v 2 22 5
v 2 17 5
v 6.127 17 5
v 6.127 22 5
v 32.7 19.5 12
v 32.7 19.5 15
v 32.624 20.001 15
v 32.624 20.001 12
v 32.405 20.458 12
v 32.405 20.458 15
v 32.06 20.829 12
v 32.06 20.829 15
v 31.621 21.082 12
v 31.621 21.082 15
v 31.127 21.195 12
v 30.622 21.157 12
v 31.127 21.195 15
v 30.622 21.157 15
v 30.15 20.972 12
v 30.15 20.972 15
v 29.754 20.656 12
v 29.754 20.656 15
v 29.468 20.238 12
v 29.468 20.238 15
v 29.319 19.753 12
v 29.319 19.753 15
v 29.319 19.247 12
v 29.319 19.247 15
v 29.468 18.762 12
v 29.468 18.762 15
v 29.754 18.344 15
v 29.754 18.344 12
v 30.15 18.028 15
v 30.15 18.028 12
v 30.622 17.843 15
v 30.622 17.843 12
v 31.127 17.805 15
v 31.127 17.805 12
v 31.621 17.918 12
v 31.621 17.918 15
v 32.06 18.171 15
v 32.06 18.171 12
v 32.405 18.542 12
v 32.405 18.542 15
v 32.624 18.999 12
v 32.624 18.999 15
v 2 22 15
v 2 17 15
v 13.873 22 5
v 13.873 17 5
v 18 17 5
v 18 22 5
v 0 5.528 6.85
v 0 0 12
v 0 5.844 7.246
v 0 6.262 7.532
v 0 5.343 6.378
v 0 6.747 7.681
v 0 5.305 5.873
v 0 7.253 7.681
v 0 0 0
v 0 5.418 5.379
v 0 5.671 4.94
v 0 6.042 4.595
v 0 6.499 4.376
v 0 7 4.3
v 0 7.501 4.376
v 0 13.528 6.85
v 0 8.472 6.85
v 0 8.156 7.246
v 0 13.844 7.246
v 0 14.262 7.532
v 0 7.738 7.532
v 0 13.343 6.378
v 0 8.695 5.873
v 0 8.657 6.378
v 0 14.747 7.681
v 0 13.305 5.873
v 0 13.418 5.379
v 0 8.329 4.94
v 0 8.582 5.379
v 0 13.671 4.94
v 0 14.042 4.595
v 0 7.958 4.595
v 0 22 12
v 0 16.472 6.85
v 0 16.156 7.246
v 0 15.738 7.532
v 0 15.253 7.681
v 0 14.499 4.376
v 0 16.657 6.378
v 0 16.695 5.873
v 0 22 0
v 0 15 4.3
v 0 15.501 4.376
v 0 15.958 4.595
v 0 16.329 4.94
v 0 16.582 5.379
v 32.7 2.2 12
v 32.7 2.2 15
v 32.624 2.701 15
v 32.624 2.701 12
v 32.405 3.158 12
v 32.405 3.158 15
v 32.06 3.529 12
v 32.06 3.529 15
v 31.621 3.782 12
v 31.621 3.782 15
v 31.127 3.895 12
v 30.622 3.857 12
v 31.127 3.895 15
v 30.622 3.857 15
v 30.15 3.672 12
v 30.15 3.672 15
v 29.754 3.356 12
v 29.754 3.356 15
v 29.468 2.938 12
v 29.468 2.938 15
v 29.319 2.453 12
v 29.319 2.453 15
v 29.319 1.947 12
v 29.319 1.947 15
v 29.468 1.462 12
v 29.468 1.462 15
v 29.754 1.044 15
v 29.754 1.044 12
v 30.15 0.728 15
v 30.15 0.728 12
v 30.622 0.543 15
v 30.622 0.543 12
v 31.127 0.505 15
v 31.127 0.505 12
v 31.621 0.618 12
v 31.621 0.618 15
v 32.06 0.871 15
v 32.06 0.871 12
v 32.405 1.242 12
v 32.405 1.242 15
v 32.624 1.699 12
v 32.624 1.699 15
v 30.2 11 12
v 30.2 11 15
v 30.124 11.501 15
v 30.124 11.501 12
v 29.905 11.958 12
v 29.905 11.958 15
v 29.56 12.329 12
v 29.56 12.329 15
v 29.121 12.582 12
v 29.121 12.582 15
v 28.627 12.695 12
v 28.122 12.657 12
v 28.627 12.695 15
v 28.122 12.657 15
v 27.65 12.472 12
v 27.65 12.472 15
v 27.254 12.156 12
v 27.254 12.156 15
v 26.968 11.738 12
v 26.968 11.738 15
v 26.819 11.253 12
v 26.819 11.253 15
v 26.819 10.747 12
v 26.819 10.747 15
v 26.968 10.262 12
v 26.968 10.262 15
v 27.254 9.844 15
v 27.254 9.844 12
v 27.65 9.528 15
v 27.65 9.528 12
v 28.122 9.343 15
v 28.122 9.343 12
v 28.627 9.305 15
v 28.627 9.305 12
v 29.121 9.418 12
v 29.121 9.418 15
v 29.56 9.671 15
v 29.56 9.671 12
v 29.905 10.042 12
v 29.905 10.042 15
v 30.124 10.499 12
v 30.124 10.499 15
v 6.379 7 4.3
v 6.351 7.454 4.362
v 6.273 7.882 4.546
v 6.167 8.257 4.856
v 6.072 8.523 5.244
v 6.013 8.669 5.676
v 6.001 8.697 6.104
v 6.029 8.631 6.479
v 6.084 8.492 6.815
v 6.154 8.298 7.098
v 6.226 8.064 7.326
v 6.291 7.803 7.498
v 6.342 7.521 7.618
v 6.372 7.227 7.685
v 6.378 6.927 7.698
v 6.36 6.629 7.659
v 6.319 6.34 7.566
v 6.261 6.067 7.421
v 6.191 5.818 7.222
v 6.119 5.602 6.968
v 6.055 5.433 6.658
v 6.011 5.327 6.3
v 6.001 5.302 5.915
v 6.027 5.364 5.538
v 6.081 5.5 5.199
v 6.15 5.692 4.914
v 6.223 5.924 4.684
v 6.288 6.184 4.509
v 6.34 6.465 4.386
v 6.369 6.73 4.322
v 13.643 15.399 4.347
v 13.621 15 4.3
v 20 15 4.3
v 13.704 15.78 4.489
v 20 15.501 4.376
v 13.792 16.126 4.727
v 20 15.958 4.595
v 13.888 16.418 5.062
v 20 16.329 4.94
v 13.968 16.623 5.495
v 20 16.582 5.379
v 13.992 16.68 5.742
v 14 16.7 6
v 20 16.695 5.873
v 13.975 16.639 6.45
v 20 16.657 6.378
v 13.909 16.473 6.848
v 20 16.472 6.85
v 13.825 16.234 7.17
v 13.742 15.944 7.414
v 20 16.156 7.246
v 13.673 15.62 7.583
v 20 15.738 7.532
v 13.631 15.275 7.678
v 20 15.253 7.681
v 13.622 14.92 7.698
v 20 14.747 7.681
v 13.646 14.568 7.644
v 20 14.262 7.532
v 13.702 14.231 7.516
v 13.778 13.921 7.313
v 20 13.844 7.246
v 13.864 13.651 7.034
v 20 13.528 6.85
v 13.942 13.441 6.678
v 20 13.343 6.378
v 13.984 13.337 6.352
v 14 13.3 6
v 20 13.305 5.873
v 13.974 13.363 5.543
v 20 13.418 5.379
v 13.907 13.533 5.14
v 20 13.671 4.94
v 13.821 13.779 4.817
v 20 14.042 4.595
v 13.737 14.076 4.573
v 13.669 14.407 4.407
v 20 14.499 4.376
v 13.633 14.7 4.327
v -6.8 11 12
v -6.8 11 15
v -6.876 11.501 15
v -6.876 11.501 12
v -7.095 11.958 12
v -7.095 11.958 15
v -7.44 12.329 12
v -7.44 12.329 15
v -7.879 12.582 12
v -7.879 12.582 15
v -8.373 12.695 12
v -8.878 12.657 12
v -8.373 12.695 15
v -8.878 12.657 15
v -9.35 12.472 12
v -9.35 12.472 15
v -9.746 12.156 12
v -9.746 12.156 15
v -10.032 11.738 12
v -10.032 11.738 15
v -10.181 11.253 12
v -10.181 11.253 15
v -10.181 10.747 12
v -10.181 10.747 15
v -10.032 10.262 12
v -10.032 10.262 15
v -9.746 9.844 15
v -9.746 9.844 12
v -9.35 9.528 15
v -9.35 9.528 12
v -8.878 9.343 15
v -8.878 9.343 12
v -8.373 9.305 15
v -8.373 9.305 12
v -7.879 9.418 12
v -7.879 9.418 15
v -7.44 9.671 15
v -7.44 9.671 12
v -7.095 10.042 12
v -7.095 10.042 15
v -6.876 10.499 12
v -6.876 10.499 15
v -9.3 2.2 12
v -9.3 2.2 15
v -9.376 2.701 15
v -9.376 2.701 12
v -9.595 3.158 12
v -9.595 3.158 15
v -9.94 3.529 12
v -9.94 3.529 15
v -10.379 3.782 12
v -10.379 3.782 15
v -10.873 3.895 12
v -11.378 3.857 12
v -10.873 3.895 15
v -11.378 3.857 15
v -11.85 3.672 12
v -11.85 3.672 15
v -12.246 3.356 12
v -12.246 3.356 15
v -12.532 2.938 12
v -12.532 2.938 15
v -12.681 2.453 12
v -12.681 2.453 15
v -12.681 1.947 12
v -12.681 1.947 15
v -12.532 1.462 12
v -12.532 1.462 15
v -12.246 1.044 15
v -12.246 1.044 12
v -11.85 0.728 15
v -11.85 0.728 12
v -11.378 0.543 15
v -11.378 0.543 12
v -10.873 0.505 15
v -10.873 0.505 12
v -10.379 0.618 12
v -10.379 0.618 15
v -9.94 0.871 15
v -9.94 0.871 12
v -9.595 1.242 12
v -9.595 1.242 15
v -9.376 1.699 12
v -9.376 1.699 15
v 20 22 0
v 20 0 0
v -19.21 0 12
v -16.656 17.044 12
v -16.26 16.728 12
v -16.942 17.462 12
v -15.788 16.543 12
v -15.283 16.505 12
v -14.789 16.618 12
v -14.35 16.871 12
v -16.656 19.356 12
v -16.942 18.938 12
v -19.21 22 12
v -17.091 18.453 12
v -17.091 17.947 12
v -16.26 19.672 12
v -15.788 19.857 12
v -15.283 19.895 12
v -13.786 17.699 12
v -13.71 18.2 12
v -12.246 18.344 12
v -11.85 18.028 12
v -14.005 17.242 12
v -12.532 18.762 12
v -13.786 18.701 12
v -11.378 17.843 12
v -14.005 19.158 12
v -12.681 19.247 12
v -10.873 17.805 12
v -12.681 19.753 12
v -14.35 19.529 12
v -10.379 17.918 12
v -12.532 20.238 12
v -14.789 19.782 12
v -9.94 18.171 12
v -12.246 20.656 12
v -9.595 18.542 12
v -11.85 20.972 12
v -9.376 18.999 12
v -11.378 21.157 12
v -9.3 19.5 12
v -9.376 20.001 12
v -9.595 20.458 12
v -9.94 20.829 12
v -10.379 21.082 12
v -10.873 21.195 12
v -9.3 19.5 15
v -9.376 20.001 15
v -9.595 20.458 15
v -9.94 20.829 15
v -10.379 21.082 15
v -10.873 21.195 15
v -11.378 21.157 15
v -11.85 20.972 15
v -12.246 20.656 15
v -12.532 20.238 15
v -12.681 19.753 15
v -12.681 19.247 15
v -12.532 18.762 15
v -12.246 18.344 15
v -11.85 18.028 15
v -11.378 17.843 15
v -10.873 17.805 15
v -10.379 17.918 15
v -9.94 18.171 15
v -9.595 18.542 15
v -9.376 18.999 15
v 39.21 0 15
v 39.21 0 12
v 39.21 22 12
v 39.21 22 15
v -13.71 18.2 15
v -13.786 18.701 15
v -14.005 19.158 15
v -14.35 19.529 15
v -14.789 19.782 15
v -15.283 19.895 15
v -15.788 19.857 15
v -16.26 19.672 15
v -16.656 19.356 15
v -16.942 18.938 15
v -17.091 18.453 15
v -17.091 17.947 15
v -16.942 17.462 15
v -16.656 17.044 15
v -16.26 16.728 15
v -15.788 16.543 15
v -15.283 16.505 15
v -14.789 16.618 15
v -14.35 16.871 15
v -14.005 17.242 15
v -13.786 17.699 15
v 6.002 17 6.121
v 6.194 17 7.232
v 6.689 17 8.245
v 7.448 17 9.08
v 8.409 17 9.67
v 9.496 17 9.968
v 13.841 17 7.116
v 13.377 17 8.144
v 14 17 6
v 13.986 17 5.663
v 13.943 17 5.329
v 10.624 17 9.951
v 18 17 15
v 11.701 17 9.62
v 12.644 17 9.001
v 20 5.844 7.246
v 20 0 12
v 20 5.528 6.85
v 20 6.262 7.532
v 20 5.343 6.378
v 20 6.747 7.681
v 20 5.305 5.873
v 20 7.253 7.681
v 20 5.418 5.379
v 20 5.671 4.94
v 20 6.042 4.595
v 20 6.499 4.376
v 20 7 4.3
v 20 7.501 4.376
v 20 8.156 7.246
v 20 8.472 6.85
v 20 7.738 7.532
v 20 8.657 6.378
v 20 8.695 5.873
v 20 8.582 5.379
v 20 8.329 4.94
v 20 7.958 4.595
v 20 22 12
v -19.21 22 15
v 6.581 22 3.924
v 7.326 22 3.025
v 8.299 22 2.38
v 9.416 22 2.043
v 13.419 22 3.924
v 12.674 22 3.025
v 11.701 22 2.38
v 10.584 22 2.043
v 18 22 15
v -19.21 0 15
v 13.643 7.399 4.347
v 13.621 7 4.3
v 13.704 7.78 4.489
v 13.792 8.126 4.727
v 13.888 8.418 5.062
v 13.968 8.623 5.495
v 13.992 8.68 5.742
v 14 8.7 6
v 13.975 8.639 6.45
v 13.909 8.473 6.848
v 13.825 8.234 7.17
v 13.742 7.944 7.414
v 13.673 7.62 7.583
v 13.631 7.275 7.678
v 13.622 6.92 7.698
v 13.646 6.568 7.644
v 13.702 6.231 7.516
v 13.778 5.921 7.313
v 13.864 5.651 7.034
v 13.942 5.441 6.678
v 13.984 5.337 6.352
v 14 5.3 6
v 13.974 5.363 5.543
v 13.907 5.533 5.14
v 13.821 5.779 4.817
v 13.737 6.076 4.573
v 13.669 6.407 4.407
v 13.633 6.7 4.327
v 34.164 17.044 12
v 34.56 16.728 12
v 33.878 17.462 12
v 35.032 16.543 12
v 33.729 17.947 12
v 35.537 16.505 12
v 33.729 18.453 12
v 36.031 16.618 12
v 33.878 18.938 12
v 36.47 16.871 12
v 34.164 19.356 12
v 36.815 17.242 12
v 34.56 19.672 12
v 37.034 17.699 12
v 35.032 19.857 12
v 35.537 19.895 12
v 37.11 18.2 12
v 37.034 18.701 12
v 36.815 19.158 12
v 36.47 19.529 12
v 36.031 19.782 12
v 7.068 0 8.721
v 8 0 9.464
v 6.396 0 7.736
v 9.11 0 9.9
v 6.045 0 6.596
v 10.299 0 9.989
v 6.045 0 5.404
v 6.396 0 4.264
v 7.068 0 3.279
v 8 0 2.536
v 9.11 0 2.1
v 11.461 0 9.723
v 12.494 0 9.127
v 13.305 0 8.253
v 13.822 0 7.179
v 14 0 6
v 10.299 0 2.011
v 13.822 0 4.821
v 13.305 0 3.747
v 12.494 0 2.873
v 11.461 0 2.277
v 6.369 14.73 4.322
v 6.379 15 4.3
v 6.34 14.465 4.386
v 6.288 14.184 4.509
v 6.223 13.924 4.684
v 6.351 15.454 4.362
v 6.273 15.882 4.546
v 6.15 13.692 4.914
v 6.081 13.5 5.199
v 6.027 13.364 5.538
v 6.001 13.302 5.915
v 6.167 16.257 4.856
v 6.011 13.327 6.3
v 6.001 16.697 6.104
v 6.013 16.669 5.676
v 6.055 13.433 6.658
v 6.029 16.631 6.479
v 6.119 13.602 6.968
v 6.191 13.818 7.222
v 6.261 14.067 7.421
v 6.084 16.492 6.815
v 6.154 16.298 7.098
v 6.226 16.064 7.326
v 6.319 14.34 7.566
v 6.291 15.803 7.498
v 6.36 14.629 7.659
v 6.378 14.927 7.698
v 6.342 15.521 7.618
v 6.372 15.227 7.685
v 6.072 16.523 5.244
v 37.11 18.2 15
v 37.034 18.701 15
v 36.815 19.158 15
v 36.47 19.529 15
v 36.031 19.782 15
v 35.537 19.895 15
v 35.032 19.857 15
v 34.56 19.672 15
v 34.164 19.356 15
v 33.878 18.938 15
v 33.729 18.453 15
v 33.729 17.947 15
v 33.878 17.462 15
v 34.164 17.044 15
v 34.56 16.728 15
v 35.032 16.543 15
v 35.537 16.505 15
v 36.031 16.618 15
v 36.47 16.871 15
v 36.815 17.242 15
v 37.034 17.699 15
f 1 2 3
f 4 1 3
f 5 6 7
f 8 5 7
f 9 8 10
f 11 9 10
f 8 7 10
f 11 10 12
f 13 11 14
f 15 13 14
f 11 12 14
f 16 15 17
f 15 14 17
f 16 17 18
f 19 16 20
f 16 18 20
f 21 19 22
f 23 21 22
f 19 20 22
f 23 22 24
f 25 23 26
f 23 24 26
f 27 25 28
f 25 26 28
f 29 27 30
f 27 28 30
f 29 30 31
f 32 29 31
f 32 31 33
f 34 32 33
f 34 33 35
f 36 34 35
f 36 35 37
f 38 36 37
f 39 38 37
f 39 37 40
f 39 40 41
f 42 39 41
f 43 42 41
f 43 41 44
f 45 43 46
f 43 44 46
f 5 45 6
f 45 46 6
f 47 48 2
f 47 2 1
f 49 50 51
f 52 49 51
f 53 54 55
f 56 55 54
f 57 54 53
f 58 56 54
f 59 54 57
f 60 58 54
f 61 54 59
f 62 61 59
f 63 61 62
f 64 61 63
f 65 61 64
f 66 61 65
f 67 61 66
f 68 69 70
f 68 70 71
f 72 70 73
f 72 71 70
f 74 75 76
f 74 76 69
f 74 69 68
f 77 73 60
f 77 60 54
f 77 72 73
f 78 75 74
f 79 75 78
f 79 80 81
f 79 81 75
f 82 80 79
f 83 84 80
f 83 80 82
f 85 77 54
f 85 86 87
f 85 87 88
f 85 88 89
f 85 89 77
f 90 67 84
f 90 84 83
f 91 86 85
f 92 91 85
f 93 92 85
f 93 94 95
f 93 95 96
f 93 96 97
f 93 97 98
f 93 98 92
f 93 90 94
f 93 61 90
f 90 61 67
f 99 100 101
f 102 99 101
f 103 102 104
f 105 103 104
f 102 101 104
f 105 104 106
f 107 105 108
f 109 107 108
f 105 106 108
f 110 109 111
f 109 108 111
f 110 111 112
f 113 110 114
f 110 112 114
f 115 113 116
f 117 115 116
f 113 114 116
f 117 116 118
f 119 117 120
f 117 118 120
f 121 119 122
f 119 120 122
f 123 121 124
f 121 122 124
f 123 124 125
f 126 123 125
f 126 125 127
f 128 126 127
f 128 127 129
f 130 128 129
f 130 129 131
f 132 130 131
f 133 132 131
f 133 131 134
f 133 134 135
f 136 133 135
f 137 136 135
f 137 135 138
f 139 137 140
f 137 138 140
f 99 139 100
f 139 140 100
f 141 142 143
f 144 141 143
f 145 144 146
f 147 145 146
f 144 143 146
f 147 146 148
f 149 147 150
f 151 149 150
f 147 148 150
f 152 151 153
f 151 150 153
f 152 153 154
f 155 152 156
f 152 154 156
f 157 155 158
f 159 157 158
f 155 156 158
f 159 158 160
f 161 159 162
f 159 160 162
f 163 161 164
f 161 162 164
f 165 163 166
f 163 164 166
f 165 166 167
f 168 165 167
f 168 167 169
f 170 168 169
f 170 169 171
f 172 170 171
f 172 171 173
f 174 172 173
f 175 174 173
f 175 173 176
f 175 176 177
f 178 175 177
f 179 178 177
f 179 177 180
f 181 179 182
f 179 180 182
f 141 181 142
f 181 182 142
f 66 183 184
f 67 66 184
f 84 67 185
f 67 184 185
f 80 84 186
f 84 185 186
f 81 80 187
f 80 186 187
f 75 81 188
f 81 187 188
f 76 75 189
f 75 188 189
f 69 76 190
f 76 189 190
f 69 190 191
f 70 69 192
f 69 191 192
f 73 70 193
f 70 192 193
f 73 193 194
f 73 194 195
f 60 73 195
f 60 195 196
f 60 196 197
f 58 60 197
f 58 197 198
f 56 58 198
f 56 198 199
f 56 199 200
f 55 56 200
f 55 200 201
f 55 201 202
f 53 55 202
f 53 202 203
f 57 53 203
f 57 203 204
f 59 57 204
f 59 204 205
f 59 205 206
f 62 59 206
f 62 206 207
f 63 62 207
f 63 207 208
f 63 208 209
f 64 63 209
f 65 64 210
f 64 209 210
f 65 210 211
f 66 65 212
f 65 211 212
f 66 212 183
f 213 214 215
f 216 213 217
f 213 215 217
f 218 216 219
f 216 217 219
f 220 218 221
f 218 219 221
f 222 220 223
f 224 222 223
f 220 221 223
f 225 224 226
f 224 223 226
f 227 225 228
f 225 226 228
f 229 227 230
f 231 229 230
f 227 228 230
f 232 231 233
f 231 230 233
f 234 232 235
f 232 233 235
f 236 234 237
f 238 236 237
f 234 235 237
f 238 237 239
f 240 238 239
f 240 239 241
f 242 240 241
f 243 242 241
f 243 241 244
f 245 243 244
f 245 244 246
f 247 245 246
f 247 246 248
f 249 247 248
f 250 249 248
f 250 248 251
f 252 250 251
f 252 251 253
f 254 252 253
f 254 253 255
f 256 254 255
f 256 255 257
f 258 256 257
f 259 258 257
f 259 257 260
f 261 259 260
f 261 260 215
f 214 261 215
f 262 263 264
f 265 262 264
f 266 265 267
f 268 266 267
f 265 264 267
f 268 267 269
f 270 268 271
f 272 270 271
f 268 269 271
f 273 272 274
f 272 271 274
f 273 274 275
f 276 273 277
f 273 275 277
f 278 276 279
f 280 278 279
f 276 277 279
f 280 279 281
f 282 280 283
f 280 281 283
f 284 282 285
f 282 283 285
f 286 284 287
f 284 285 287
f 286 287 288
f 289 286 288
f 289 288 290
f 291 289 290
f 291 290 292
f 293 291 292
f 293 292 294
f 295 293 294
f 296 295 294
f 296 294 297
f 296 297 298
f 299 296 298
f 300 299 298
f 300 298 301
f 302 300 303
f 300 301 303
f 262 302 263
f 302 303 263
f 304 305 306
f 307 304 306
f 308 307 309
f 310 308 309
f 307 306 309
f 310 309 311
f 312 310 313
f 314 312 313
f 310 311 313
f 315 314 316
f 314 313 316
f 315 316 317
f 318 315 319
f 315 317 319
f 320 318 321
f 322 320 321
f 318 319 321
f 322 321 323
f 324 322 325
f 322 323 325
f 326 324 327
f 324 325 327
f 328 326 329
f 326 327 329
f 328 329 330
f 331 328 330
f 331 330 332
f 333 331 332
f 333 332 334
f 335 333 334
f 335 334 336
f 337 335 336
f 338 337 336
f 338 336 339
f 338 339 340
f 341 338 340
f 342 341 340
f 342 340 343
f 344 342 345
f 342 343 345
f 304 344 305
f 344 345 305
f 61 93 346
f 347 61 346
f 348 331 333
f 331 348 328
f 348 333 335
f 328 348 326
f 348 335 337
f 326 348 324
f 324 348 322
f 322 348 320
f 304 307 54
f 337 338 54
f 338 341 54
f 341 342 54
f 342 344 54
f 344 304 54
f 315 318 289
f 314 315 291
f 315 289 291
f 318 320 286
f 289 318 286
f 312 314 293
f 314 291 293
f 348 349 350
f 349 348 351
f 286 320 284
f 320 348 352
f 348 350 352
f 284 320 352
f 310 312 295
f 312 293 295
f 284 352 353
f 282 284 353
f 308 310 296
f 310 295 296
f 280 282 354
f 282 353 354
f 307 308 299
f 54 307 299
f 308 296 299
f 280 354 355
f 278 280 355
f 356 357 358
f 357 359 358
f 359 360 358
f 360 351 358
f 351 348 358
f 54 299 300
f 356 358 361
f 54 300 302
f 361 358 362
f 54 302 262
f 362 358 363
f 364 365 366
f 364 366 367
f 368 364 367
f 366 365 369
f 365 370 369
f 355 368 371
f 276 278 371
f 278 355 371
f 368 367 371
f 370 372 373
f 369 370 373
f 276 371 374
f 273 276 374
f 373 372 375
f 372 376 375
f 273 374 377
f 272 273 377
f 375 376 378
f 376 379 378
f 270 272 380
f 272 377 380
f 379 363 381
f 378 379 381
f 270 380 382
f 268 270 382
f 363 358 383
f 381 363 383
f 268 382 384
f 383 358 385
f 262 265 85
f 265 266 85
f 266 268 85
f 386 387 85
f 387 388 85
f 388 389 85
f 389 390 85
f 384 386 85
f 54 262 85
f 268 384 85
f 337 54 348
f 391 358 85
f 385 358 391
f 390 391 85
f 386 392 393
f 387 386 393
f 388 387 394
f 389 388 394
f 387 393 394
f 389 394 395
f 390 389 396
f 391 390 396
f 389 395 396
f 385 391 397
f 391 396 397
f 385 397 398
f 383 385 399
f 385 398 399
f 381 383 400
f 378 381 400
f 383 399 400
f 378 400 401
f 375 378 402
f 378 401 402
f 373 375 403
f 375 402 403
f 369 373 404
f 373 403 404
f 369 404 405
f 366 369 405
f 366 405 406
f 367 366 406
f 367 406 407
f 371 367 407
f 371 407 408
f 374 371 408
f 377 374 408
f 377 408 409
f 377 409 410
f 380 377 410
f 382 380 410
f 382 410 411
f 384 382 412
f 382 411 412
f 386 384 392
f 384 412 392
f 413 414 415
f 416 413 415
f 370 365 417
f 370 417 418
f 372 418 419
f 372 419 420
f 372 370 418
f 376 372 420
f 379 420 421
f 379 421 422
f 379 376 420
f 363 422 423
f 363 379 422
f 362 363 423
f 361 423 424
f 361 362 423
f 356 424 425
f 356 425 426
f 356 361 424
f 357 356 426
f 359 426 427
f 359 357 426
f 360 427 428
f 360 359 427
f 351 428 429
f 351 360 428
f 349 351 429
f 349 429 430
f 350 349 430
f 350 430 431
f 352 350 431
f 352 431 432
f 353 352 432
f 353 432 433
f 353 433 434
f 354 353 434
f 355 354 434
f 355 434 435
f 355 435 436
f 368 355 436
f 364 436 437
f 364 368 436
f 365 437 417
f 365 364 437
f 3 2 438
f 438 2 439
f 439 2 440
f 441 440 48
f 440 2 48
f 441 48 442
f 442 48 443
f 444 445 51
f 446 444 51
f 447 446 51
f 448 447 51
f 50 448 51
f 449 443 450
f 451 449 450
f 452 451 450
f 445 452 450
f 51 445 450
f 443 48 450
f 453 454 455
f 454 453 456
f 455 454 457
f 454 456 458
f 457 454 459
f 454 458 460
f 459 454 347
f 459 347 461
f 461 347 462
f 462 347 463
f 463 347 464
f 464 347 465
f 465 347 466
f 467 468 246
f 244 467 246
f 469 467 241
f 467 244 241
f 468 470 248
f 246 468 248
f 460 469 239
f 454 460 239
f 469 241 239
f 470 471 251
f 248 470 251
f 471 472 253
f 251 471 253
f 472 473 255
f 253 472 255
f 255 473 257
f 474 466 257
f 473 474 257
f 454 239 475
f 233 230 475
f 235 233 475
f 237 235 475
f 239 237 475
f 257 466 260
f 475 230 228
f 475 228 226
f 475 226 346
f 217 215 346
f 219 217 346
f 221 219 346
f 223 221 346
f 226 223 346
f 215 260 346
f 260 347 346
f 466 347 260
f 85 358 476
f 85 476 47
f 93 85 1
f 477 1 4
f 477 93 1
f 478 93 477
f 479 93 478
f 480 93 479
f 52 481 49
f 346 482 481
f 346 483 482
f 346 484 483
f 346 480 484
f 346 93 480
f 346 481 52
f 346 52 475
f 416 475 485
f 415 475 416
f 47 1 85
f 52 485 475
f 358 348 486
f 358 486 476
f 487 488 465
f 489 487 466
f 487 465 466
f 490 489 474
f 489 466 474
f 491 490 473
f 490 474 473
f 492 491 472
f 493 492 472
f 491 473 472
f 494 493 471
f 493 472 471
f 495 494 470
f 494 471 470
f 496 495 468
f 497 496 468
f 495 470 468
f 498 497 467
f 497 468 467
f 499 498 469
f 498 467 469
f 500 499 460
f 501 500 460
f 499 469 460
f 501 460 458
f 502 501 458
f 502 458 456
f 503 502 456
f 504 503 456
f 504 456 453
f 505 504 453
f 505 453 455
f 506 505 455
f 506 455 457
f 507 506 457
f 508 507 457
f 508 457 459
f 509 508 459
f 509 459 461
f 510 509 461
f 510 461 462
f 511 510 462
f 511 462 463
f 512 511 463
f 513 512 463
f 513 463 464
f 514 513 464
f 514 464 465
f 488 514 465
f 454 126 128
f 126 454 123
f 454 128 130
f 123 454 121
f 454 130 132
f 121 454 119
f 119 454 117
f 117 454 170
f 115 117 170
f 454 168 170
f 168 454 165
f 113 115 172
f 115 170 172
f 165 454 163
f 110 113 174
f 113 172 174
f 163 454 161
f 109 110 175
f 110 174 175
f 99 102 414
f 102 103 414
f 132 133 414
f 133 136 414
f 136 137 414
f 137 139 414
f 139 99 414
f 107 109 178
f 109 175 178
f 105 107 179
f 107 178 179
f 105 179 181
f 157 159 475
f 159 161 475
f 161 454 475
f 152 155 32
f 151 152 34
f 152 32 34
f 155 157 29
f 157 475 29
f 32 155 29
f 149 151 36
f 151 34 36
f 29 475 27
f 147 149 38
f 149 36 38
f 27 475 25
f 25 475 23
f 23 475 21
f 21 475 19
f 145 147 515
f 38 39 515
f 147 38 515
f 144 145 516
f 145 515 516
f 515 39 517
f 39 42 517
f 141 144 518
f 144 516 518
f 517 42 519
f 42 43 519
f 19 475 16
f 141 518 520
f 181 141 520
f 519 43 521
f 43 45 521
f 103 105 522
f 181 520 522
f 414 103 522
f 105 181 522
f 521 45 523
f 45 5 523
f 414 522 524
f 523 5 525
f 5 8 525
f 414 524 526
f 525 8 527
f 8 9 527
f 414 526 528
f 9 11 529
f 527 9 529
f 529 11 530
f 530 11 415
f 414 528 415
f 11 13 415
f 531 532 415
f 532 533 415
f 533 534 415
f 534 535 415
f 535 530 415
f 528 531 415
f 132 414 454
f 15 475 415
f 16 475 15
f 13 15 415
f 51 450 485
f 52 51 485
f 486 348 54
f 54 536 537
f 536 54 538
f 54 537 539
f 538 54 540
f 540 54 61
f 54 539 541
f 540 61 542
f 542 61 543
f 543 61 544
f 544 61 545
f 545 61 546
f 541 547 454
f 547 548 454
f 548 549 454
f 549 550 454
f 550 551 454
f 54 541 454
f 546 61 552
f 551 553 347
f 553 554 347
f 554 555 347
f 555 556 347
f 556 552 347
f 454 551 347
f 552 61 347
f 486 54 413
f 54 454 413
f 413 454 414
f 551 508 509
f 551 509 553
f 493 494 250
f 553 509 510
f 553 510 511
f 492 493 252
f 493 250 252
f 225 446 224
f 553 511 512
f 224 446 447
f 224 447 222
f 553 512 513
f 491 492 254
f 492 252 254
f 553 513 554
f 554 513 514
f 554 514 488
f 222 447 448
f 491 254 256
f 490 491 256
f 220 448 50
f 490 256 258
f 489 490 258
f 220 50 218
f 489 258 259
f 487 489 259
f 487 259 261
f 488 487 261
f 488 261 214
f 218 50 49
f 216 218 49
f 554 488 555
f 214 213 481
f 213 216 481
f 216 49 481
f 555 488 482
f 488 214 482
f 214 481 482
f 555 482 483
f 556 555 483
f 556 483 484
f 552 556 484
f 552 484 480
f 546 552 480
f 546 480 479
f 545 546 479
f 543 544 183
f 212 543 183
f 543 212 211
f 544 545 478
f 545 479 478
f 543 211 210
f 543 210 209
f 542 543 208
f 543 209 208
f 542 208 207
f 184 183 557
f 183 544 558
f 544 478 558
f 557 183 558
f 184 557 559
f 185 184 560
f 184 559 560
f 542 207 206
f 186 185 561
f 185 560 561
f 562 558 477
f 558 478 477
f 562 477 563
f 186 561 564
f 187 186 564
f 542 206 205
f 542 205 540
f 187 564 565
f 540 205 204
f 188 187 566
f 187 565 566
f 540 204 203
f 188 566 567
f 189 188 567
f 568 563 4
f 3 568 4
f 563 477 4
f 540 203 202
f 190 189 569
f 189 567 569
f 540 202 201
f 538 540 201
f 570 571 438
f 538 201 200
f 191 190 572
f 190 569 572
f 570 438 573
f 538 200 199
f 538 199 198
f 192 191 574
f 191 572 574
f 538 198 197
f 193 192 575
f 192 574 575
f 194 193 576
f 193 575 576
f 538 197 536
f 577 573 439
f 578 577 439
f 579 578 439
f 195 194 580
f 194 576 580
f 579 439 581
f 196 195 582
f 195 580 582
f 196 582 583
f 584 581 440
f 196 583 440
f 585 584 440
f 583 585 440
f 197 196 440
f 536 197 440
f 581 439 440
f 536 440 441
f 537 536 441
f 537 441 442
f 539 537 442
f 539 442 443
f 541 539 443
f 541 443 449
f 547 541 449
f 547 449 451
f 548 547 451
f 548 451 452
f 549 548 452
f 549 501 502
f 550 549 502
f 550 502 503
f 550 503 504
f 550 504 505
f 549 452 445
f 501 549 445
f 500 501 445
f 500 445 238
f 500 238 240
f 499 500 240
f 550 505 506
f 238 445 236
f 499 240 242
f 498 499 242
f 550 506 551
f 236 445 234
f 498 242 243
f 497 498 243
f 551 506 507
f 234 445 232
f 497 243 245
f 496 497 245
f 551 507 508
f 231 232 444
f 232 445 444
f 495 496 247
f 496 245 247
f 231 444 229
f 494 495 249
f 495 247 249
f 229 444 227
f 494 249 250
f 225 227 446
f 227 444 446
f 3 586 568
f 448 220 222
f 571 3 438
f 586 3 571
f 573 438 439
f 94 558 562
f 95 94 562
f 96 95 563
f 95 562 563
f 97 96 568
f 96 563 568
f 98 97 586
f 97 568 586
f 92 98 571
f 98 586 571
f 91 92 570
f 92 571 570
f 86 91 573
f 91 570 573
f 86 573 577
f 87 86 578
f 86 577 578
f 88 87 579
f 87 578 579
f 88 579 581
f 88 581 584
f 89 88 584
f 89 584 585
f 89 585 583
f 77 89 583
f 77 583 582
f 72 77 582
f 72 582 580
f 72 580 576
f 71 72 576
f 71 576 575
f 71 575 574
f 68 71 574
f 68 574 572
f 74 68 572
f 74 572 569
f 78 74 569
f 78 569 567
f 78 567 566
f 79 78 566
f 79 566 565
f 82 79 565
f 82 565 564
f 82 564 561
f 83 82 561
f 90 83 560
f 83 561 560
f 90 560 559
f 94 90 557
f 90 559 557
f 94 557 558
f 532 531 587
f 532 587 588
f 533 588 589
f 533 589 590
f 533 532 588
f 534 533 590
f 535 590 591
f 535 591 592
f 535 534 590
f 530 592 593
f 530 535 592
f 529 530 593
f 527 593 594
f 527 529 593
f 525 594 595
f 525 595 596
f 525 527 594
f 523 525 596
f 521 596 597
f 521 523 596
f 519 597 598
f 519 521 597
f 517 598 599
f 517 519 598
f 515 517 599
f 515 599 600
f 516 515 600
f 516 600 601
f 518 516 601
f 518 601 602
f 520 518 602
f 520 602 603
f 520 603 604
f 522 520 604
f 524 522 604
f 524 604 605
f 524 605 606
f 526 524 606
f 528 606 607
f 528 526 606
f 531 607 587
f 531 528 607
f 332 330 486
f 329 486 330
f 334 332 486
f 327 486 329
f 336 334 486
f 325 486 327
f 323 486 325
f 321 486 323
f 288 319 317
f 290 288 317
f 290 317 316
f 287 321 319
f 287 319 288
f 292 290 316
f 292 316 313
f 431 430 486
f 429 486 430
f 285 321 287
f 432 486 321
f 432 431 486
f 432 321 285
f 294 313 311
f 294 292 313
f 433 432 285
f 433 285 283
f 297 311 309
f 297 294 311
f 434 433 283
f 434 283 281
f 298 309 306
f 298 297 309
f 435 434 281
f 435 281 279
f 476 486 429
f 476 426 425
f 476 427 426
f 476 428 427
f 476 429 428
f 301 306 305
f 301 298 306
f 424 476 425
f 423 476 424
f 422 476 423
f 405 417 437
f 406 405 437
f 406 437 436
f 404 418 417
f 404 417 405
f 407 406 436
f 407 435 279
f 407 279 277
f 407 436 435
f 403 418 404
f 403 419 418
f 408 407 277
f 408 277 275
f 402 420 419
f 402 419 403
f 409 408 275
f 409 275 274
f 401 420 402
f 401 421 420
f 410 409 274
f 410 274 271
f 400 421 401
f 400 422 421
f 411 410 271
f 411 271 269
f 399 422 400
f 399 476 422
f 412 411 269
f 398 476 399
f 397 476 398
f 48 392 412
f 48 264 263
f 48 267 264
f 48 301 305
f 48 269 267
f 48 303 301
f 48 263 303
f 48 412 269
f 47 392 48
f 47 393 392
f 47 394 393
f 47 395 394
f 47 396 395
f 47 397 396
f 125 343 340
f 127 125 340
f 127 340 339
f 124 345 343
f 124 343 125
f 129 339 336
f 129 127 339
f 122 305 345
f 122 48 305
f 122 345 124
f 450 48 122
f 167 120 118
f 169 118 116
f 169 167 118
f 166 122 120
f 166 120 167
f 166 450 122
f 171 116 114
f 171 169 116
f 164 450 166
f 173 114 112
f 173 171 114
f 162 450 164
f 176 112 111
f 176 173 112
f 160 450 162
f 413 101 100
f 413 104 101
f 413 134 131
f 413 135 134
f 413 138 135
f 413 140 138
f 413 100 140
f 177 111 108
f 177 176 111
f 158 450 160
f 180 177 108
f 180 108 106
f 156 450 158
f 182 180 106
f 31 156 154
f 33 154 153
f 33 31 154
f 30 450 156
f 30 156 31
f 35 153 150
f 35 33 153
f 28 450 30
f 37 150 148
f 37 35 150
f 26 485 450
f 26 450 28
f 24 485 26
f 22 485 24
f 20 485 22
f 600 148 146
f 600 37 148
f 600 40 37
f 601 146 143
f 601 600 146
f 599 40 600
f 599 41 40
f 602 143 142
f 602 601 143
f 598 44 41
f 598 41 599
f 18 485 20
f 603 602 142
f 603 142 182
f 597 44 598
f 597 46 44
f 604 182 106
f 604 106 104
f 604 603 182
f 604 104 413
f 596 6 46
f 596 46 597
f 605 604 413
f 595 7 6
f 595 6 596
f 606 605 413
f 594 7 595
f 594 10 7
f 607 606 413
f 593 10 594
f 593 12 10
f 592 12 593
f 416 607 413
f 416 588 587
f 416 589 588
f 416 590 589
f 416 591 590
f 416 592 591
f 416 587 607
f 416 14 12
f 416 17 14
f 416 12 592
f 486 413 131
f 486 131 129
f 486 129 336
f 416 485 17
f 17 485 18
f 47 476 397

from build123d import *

# Parameters (mm, degrees)
ESQUISSE1_W             = 20
ESQUISSE1_H             = 22
BOSS_EXTRU_1_DEPTH      = 12
ESQUISSE2_R             = 4
ENL_V_MAT_EXTRU_1_DEPTH = 26
ESQUISSE4_W             = 58.42
ESQUISSE4_H             = 22
ESQUISSE4_R             = 1.7
BOSS_EXTRU_2_DEPTH      = 3
ESQUISSE5_R             = 1.7
ENL_V_MAT_EXTRU_2_DEPTH = 3
ESQUISSE3_R             = 1.7
ENL_V_MAT_EXTRU_3_DEPTH = 27
ESQUISSE6_W             = 16
ESQUISSE6_H             = 5
ENL_V_MAT_EXTRU_4_DEPTH = 10


with BuildPart() as part:
    # Esquisse1 → Boss.-Extru.1 (new body)
    with BuildSketch(Plane.XY):
        with Locations((10, 11)):
            Rectangle(ESQUISSE1_W, ESQUISSE1_H)
    extrude(amount=BOSS_EXTRU_1_DEPTH)

    # Esquisse2 → Enlèv. mat.-Extru.1 (cut)
    with BuildSketch(Plane(origin=(0, 22, 0), x_dir=(1, 0, 0), z_dir=(0, 1, 0))):
        with Locations((10, -6)):
            Circle(ESQUISSE2_R)
    extrude(amount=-ENL_V_MAT_EXTRU_1_DEPTH, mode=Mode.SUBTRACT)

    # Esquisse4 → Boss.-Extru.2 (add)
    with BuildSketch(Plane.XY.offset(12)):
        with Locations((10, 11)):
            Rectangle(ESQUISSE4_W, ESQUISSE4_H)
        with Locations((-15.41, 18.2)):
            Circle(ESQUISSE4_R, mode=Mode.SUBTRACT)
        with Locations((35.41, 18.2)):
            Circle(ESQUISSE4_R, mode=Mode.SUBTRACT)
    extrude(amount=BOSS_EXTRU_2_DEPTH)

    # Esquisse5 → Enlèv. mat.-Extru.2 (cut)
    with BuildSketch(Plane.XY.offset(15)):
        with Locations((-11, 19.5)):
            Circle(ESQUISSE5_R)
        with Locations((-11, 2.2)):
            Circle(ESQUISSE5_R)
        with Locations((31, 2.2)):
            Circle(ESQUISSE5_R)
        with Locations((31, 19.5)):
            Circle(ESQUISSE5_R)
        with Locations((-8.5, 11)):
            Circle(ESQUISSE5_R)
        with Locations((28.5, 11)):
            Circle(ESQUISSE5_R)
    extrude(amount=-ENL_V_MAT_EXTRU_2_DEPTH, mode=Mode.SUBTRACT)

    # Esquisse3 → Enlèv. mat.-Extru.3 (cut)
    with BuildSketch(Plane(origin=(20, 0, 0), x_dir=(0, 0, -1), z_dir=(1, 0, 0))):
        with Locations((-6, 15)):
            Circle(ESQUISSE3_R)
        with Locations((-6, 7)):
            Circle(ESQUISSE3_R)
    extrude(amount=-ENL_V_MAT_EXTRU_3_DEPTH, mode=Mode.SUBTRACT)

    # Esquisse6 → Enlèv. mat.-Extru.4 (cut)
    with BuildSketch(Plane.XY.offset(15)):
        with Locations((10, 19.5)):
            Rectangle(ESQUISSE6_W, ESQUISSE6_H)
    extrude(amount=-ENL_V_MAT_EXTRU_4_DEPTH, mode=Mode.SUBTRACT)


solid = part.part
